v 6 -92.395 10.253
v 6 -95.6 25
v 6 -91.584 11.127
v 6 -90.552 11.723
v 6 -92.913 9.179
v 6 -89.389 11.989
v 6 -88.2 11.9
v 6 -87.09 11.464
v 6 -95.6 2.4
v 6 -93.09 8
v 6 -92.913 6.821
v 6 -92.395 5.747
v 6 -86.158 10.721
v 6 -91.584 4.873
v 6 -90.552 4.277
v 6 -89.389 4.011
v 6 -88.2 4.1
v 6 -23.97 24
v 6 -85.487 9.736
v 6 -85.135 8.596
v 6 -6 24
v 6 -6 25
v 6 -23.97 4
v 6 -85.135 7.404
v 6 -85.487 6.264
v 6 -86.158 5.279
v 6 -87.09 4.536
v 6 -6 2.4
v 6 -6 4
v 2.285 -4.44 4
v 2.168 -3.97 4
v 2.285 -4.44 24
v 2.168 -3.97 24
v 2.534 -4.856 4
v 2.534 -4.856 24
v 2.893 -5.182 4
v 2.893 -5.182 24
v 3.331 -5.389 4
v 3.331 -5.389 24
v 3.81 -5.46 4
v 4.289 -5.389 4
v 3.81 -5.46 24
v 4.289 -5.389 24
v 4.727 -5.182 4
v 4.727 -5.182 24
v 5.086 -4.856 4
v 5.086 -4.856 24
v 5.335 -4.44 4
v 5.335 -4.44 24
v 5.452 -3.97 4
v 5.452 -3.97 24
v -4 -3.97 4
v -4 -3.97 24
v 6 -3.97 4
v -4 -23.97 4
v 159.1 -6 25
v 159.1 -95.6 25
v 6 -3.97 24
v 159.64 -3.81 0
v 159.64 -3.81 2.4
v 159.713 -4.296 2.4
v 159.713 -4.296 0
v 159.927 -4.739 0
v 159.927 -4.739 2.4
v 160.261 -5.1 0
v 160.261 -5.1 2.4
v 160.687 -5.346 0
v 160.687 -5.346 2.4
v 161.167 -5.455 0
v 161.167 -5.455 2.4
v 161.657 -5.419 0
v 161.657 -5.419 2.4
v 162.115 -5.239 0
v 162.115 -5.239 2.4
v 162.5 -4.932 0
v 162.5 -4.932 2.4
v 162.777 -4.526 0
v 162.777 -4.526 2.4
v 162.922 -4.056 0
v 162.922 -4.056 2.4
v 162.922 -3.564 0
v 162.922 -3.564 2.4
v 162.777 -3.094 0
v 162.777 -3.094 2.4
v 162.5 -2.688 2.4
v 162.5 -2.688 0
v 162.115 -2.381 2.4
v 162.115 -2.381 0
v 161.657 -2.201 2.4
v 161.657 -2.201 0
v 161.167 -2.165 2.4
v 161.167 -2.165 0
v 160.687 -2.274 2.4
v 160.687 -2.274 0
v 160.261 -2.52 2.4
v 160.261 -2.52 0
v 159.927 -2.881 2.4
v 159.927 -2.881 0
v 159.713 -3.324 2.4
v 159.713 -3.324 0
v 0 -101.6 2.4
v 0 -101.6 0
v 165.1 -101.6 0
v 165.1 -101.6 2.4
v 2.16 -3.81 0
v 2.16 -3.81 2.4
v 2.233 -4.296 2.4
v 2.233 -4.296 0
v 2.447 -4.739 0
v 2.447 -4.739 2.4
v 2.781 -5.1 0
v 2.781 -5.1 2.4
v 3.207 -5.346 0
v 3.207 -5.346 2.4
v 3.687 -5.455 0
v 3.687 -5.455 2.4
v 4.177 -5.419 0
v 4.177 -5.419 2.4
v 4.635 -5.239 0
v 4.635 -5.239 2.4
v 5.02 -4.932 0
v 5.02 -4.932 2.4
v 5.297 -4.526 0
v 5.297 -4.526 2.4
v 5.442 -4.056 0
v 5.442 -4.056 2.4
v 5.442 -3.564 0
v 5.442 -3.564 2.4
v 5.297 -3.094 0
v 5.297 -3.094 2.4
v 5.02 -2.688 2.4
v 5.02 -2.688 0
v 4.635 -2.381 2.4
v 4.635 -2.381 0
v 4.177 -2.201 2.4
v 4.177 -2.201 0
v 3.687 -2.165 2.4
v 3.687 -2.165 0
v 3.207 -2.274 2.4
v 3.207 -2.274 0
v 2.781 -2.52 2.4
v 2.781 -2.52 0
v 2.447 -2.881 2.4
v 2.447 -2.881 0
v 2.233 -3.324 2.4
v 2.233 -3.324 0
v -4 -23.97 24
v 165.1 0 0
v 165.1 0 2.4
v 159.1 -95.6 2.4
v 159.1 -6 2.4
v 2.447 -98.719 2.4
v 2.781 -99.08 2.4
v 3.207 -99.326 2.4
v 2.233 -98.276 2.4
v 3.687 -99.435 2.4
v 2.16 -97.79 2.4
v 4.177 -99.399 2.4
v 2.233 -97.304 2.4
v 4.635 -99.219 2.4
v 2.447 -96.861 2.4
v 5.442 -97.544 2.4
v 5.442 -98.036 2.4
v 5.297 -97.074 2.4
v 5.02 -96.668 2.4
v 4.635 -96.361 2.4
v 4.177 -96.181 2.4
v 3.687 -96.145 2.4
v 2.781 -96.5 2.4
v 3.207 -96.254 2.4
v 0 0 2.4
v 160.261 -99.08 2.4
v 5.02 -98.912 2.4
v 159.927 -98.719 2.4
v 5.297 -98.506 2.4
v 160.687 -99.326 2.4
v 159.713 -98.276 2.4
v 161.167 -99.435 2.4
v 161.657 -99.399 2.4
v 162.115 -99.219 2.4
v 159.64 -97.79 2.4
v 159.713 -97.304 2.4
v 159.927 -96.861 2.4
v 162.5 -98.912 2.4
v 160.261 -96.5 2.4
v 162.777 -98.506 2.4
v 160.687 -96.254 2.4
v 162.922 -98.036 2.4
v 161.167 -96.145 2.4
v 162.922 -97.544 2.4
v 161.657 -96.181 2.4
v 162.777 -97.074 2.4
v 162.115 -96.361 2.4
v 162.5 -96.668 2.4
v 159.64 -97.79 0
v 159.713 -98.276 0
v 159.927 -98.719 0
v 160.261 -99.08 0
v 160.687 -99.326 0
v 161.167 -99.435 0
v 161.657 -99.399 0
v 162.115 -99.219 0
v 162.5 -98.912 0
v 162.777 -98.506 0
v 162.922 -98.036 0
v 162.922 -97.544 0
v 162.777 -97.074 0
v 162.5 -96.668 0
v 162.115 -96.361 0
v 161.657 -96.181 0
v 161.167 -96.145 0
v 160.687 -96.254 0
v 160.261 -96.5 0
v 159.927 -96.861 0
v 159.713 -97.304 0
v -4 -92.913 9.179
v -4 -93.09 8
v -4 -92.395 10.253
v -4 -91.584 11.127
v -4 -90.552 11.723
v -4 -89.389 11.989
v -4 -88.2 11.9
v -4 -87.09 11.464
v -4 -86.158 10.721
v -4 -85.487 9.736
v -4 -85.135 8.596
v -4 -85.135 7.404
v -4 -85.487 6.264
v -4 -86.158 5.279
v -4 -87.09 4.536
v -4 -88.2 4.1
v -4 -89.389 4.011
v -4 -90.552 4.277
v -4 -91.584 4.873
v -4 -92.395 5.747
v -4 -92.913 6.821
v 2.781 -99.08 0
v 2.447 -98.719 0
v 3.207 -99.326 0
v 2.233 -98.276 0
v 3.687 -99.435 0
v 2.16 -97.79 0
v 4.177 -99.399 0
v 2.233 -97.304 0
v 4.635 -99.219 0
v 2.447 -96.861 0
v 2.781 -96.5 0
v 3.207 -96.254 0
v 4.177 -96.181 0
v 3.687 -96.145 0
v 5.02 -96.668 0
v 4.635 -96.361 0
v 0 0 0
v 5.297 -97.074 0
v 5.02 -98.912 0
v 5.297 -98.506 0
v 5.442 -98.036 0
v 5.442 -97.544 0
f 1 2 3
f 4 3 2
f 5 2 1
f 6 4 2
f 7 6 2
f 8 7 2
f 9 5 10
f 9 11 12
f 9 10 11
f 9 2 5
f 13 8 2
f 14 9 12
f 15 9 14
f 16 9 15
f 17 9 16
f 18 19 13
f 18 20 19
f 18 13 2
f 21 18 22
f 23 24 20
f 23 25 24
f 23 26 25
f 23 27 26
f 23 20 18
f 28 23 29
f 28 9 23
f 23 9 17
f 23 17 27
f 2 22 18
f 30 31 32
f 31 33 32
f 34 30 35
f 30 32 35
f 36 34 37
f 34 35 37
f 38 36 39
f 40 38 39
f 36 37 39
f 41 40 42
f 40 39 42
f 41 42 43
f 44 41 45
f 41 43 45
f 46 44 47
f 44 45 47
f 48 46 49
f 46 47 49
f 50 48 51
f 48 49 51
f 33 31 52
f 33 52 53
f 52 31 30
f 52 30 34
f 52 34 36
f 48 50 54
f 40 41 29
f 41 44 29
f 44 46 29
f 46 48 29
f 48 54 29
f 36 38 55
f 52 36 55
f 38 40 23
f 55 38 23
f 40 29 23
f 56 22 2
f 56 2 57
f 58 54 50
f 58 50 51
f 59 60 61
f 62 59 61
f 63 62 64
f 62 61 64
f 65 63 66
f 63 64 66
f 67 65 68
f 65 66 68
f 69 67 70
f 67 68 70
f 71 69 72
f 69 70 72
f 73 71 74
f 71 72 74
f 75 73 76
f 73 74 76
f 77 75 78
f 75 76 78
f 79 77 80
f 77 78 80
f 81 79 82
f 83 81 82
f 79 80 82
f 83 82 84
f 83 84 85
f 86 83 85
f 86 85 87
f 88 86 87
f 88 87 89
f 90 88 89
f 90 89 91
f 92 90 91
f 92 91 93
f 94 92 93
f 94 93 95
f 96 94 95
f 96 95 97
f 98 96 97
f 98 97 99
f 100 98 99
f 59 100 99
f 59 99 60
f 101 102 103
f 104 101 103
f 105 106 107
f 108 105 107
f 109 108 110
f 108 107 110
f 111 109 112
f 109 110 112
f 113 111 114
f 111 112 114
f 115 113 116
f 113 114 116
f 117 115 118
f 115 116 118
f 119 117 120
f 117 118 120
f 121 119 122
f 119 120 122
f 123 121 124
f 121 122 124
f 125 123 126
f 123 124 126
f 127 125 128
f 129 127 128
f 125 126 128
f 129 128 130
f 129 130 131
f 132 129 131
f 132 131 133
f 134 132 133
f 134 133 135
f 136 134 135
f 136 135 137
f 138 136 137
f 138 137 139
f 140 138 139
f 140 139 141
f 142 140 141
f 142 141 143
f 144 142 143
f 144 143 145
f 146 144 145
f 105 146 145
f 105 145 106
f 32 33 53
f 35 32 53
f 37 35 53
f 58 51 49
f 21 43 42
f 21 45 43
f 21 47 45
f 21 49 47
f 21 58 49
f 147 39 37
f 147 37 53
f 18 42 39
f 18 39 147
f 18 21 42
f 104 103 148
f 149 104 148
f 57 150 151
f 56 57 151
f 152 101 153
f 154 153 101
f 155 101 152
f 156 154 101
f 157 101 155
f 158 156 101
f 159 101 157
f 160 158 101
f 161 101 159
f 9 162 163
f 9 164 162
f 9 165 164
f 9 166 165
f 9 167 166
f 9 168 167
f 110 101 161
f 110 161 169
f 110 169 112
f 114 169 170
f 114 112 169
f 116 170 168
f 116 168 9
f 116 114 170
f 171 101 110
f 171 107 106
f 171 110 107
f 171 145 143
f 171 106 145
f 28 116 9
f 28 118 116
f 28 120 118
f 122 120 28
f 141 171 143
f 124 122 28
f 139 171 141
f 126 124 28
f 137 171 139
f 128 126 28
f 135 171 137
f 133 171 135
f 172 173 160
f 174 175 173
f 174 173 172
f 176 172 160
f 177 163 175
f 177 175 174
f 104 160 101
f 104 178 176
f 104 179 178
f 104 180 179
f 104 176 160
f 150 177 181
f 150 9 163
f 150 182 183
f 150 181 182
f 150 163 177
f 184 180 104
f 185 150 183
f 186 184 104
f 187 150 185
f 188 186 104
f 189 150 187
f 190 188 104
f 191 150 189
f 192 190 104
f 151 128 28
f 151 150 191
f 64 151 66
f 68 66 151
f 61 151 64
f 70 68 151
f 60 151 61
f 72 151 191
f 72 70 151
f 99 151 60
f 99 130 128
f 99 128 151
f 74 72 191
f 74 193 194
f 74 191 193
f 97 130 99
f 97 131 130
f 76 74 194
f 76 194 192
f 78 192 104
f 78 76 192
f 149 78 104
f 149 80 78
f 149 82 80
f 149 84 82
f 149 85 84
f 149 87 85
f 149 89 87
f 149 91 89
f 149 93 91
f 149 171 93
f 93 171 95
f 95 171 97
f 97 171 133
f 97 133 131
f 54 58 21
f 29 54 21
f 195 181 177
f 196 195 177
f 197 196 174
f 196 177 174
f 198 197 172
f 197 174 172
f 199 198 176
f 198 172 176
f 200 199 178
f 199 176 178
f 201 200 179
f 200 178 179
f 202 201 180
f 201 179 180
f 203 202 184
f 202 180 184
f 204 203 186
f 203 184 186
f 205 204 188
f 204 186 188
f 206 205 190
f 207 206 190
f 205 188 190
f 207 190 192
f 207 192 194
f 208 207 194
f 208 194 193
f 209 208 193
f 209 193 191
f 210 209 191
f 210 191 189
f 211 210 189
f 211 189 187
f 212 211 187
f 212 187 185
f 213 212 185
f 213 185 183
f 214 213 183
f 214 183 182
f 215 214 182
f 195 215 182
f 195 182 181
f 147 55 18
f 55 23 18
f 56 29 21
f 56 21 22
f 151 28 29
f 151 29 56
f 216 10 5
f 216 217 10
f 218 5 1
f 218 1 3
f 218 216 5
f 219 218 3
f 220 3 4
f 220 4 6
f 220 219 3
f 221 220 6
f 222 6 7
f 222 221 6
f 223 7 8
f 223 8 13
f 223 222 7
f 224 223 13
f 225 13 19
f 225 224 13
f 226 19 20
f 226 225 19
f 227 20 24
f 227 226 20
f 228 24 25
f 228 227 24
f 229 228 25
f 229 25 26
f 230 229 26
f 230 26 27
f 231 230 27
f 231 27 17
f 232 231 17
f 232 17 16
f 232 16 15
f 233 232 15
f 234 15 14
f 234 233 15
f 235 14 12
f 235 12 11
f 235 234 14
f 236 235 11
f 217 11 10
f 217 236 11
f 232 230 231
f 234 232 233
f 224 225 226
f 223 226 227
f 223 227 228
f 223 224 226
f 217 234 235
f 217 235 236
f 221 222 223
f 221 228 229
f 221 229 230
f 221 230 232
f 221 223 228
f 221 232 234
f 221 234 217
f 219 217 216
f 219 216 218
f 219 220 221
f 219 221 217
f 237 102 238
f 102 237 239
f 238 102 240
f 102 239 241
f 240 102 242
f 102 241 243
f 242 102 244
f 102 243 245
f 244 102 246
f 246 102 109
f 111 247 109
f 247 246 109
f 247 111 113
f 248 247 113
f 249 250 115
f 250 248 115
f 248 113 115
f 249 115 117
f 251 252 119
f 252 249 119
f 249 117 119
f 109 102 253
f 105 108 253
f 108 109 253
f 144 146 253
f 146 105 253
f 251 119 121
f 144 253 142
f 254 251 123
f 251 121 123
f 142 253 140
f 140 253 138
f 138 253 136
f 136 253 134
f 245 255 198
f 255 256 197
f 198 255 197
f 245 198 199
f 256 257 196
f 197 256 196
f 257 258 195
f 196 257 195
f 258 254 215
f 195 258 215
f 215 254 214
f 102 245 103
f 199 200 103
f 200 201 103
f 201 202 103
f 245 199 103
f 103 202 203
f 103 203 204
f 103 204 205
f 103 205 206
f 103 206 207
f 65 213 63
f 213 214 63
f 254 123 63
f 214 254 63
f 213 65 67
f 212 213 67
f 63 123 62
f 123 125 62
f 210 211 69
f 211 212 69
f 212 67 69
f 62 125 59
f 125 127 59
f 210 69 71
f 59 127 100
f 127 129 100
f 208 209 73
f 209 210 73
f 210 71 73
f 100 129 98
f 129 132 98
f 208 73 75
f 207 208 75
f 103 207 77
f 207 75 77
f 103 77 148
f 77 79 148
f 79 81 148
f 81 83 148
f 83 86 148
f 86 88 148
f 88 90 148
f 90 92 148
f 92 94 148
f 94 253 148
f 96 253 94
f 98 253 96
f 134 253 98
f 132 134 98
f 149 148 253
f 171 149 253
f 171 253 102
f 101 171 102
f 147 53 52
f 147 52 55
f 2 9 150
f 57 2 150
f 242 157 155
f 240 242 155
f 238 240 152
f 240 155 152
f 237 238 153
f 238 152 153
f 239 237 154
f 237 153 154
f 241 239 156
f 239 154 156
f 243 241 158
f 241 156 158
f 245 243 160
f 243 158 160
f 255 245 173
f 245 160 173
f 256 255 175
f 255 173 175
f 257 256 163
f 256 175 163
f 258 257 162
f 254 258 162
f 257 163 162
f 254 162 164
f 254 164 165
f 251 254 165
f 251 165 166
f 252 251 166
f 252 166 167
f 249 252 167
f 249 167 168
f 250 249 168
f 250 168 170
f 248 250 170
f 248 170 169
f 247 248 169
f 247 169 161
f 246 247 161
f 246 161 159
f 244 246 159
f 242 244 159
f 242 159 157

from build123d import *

# Parameters (mm, degrees)
F0_W          = 153.1
F0_H          = 89.6
F1_DEPTH      = 2.4
F2_DEPTH      = 25
F3_W          = 20
F3_H          = 20
F3_R          = 4
F4_DEPTH      = 6
F4_DEPTH_BACK = 4
F5_D          = 3.3


with BuildPart() as f1:
    # F0 (on Top) → F1 (new body)
    with BuildSketch(Plane.XY):
        Polygon((165.1, 0), (0, 0), (0, -7.62), (0, -20.32), (0, -86.995), (0, -91.186), (0, -101.6), (165.1, -101.6), align=None)
        with Locations((82.55, -50.8)):
            Rectangle(F0_W, F0_H, mode=Mode.SUBTRACT)
    extrude(amount=F1_DEPTH)

    # F0 (on Top) → F2 (join)
    with BuildSketch(Plane.XY):
        with Locations((82.55, -50.8)):
            Rectangle(F0_W, F0_H)
    extrude(amount=F2_DEPTH)

    # F3 (on face) → F4 (join, two sides)
    with BuildSketch(Plane(origin=(0, 0, 0), x_dir=(0, -1, 0), z_dir=(-1, 0, 0))) as f4_sk:
        with Locations((13.97, 14)):
            Rectangle(F3_W, F3_H)
        with Locations((89.0905, 8)):
            Circle(F3_R)
    extrude(amount=-F4_DEPTH)
    extrude(f4_sk.sketch, amount=F4_DEPTH_BACK)

    # F5 (through all)
    with Locations(Plane(origin=(0, 0, 0), x_dir=(1, 0, 0), z_dir=(0, 0, -1))):
        with Locations((3.81, 3.81), (3.81, 97.79), (161.29, 97.79), (161.29, 3.81)):
            Hole(F5_D / 2)


solid = f1.part
